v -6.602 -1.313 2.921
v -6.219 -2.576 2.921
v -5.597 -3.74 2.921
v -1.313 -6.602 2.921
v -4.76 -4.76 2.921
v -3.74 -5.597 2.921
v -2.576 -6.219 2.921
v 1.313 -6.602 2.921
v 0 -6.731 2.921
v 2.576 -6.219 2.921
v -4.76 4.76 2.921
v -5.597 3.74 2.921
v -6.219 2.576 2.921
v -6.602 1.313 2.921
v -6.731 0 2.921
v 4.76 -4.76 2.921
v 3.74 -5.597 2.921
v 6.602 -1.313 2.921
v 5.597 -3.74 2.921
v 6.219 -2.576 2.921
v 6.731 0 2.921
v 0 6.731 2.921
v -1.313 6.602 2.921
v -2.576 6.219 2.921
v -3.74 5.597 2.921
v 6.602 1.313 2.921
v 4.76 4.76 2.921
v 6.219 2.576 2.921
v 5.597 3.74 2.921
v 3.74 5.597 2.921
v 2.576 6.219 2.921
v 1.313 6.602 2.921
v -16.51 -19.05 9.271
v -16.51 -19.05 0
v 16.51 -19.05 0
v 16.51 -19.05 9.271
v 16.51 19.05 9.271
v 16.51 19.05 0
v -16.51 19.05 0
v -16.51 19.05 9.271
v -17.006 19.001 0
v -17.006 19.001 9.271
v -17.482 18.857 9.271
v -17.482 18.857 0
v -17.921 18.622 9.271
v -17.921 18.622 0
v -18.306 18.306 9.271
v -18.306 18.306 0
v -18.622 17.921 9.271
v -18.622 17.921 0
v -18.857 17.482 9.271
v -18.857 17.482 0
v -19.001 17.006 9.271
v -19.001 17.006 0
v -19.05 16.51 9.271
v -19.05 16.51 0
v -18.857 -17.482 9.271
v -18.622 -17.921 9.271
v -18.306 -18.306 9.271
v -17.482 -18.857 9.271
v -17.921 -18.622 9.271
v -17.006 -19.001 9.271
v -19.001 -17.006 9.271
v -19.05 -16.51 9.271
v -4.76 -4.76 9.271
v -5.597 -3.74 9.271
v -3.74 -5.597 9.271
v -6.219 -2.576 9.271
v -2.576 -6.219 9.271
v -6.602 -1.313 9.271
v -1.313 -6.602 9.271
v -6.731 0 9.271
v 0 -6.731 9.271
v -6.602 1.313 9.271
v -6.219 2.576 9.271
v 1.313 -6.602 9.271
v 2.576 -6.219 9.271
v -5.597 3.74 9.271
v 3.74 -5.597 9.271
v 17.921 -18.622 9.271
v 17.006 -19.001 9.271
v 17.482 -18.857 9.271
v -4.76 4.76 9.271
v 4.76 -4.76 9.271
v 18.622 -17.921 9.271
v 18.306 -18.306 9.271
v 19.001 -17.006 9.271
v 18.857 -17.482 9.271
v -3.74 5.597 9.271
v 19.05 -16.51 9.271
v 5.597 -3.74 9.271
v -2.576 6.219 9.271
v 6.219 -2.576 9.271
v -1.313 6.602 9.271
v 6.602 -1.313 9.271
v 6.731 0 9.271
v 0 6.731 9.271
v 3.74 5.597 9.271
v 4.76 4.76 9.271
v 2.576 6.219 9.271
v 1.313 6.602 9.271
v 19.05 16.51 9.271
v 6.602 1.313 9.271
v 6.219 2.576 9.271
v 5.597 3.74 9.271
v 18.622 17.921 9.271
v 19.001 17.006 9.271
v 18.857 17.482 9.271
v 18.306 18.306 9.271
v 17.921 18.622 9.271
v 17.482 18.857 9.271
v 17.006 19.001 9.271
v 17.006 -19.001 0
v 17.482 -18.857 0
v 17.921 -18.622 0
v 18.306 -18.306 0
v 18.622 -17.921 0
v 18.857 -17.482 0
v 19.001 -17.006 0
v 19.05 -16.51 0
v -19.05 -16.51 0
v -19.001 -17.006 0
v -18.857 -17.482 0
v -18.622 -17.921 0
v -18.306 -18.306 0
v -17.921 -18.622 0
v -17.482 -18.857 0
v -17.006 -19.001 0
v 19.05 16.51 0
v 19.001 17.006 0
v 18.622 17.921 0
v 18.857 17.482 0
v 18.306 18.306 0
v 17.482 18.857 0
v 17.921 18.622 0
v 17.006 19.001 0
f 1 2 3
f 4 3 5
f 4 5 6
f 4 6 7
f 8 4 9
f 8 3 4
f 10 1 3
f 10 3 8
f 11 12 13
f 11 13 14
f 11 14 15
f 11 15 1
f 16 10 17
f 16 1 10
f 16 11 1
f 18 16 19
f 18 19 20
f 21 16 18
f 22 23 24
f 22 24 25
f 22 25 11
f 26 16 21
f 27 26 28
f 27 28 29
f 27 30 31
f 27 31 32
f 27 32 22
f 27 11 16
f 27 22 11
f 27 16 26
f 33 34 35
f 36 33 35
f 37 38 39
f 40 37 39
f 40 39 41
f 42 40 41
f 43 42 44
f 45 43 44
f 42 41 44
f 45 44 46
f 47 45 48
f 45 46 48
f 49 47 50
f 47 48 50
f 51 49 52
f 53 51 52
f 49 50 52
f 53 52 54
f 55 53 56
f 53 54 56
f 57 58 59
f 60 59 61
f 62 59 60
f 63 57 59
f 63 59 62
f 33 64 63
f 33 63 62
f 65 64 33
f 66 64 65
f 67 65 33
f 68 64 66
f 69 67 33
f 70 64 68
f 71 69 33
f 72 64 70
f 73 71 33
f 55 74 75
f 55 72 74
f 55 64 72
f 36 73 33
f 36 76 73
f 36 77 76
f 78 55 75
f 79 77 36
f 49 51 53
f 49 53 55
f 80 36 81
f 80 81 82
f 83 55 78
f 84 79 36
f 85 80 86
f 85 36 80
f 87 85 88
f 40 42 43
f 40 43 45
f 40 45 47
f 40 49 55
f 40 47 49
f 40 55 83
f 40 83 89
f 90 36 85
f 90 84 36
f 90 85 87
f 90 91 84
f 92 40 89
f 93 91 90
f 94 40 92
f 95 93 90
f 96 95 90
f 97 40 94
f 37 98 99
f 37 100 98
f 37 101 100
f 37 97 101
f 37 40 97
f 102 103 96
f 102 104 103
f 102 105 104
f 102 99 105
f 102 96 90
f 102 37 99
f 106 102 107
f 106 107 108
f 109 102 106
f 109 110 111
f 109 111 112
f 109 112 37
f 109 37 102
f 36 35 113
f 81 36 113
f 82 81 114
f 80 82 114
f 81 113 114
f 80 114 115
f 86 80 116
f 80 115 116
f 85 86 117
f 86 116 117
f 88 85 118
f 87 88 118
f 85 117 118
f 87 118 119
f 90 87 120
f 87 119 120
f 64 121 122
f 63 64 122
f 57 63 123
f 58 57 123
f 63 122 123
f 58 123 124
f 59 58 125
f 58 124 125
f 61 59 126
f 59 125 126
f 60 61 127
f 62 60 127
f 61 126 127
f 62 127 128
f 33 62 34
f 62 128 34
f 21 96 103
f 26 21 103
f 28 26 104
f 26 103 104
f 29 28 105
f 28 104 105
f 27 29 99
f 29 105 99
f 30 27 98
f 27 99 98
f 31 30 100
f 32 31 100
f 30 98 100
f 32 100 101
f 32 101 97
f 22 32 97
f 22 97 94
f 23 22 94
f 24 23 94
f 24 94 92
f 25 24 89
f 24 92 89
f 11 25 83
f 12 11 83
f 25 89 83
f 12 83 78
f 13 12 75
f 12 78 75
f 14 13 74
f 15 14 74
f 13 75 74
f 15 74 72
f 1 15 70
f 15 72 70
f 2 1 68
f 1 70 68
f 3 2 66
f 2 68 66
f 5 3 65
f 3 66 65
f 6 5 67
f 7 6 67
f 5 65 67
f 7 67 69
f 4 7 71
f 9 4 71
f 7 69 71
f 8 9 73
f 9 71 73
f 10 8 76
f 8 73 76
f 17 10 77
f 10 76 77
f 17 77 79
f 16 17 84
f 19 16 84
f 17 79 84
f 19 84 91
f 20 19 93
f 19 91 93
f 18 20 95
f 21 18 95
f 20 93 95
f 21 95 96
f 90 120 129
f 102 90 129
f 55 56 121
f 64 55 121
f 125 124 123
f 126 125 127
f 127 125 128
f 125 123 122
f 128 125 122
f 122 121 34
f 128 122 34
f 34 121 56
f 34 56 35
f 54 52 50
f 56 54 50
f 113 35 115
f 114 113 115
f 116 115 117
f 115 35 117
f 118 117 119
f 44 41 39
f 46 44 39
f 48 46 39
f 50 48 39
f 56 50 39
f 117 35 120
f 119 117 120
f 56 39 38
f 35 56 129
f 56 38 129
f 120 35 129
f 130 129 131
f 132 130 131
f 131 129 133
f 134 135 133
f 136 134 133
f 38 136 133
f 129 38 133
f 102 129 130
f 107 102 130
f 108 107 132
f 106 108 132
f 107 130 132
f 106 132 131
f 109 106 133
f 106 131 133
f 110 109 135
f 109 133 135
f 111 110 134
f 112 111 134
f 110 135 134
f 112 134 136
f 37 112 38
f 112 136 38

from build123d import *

# Parameters (mm, degrees)
F1_DEPTH = 9.271
F2_R     = 6.731
F3_DEPTH = 6.35


with BuildPart() as f1:
    # F0 (on Top) → F1 (new body)
    with BuildSketch(Plane.XY):
        with BuildLine():
            Line((16.51, 19.05), (-16.51, 19.05))
            ThreePointArc((-16.51, 19.05), (-18.306051, 18.306051), (-19.05, 16.51))
            Line((-19.05, 16.51), (-19.05, -16.51))
            ThreePointArc((-19.05, -16.51), (-18.306051, -18.306051), (-16.51, -19.05))
            Line((-16.51, -19.05), (16.51, -19.05))
            ThreePointArc((16.51, -19.05), (18.306051, -18.306051), (19.05, -16.51))
            Line((19.05, -16.51), (19.05, 16.51))
            ThreePointArc((19.05, 16.51), (18.306051, 18.306051), (16.51, 19.05))
        make_face()
    extrude(amount=F1_DEPTH)

    # F2 (on face) → F3 (cut)
    with BuildSketch(Plane.XY.offset(9.271)):
        Circle(F2_R)
    extrude(amount=-F3_DEPTH, mode=Mode.SUBTRACT)


solid = f1.part
